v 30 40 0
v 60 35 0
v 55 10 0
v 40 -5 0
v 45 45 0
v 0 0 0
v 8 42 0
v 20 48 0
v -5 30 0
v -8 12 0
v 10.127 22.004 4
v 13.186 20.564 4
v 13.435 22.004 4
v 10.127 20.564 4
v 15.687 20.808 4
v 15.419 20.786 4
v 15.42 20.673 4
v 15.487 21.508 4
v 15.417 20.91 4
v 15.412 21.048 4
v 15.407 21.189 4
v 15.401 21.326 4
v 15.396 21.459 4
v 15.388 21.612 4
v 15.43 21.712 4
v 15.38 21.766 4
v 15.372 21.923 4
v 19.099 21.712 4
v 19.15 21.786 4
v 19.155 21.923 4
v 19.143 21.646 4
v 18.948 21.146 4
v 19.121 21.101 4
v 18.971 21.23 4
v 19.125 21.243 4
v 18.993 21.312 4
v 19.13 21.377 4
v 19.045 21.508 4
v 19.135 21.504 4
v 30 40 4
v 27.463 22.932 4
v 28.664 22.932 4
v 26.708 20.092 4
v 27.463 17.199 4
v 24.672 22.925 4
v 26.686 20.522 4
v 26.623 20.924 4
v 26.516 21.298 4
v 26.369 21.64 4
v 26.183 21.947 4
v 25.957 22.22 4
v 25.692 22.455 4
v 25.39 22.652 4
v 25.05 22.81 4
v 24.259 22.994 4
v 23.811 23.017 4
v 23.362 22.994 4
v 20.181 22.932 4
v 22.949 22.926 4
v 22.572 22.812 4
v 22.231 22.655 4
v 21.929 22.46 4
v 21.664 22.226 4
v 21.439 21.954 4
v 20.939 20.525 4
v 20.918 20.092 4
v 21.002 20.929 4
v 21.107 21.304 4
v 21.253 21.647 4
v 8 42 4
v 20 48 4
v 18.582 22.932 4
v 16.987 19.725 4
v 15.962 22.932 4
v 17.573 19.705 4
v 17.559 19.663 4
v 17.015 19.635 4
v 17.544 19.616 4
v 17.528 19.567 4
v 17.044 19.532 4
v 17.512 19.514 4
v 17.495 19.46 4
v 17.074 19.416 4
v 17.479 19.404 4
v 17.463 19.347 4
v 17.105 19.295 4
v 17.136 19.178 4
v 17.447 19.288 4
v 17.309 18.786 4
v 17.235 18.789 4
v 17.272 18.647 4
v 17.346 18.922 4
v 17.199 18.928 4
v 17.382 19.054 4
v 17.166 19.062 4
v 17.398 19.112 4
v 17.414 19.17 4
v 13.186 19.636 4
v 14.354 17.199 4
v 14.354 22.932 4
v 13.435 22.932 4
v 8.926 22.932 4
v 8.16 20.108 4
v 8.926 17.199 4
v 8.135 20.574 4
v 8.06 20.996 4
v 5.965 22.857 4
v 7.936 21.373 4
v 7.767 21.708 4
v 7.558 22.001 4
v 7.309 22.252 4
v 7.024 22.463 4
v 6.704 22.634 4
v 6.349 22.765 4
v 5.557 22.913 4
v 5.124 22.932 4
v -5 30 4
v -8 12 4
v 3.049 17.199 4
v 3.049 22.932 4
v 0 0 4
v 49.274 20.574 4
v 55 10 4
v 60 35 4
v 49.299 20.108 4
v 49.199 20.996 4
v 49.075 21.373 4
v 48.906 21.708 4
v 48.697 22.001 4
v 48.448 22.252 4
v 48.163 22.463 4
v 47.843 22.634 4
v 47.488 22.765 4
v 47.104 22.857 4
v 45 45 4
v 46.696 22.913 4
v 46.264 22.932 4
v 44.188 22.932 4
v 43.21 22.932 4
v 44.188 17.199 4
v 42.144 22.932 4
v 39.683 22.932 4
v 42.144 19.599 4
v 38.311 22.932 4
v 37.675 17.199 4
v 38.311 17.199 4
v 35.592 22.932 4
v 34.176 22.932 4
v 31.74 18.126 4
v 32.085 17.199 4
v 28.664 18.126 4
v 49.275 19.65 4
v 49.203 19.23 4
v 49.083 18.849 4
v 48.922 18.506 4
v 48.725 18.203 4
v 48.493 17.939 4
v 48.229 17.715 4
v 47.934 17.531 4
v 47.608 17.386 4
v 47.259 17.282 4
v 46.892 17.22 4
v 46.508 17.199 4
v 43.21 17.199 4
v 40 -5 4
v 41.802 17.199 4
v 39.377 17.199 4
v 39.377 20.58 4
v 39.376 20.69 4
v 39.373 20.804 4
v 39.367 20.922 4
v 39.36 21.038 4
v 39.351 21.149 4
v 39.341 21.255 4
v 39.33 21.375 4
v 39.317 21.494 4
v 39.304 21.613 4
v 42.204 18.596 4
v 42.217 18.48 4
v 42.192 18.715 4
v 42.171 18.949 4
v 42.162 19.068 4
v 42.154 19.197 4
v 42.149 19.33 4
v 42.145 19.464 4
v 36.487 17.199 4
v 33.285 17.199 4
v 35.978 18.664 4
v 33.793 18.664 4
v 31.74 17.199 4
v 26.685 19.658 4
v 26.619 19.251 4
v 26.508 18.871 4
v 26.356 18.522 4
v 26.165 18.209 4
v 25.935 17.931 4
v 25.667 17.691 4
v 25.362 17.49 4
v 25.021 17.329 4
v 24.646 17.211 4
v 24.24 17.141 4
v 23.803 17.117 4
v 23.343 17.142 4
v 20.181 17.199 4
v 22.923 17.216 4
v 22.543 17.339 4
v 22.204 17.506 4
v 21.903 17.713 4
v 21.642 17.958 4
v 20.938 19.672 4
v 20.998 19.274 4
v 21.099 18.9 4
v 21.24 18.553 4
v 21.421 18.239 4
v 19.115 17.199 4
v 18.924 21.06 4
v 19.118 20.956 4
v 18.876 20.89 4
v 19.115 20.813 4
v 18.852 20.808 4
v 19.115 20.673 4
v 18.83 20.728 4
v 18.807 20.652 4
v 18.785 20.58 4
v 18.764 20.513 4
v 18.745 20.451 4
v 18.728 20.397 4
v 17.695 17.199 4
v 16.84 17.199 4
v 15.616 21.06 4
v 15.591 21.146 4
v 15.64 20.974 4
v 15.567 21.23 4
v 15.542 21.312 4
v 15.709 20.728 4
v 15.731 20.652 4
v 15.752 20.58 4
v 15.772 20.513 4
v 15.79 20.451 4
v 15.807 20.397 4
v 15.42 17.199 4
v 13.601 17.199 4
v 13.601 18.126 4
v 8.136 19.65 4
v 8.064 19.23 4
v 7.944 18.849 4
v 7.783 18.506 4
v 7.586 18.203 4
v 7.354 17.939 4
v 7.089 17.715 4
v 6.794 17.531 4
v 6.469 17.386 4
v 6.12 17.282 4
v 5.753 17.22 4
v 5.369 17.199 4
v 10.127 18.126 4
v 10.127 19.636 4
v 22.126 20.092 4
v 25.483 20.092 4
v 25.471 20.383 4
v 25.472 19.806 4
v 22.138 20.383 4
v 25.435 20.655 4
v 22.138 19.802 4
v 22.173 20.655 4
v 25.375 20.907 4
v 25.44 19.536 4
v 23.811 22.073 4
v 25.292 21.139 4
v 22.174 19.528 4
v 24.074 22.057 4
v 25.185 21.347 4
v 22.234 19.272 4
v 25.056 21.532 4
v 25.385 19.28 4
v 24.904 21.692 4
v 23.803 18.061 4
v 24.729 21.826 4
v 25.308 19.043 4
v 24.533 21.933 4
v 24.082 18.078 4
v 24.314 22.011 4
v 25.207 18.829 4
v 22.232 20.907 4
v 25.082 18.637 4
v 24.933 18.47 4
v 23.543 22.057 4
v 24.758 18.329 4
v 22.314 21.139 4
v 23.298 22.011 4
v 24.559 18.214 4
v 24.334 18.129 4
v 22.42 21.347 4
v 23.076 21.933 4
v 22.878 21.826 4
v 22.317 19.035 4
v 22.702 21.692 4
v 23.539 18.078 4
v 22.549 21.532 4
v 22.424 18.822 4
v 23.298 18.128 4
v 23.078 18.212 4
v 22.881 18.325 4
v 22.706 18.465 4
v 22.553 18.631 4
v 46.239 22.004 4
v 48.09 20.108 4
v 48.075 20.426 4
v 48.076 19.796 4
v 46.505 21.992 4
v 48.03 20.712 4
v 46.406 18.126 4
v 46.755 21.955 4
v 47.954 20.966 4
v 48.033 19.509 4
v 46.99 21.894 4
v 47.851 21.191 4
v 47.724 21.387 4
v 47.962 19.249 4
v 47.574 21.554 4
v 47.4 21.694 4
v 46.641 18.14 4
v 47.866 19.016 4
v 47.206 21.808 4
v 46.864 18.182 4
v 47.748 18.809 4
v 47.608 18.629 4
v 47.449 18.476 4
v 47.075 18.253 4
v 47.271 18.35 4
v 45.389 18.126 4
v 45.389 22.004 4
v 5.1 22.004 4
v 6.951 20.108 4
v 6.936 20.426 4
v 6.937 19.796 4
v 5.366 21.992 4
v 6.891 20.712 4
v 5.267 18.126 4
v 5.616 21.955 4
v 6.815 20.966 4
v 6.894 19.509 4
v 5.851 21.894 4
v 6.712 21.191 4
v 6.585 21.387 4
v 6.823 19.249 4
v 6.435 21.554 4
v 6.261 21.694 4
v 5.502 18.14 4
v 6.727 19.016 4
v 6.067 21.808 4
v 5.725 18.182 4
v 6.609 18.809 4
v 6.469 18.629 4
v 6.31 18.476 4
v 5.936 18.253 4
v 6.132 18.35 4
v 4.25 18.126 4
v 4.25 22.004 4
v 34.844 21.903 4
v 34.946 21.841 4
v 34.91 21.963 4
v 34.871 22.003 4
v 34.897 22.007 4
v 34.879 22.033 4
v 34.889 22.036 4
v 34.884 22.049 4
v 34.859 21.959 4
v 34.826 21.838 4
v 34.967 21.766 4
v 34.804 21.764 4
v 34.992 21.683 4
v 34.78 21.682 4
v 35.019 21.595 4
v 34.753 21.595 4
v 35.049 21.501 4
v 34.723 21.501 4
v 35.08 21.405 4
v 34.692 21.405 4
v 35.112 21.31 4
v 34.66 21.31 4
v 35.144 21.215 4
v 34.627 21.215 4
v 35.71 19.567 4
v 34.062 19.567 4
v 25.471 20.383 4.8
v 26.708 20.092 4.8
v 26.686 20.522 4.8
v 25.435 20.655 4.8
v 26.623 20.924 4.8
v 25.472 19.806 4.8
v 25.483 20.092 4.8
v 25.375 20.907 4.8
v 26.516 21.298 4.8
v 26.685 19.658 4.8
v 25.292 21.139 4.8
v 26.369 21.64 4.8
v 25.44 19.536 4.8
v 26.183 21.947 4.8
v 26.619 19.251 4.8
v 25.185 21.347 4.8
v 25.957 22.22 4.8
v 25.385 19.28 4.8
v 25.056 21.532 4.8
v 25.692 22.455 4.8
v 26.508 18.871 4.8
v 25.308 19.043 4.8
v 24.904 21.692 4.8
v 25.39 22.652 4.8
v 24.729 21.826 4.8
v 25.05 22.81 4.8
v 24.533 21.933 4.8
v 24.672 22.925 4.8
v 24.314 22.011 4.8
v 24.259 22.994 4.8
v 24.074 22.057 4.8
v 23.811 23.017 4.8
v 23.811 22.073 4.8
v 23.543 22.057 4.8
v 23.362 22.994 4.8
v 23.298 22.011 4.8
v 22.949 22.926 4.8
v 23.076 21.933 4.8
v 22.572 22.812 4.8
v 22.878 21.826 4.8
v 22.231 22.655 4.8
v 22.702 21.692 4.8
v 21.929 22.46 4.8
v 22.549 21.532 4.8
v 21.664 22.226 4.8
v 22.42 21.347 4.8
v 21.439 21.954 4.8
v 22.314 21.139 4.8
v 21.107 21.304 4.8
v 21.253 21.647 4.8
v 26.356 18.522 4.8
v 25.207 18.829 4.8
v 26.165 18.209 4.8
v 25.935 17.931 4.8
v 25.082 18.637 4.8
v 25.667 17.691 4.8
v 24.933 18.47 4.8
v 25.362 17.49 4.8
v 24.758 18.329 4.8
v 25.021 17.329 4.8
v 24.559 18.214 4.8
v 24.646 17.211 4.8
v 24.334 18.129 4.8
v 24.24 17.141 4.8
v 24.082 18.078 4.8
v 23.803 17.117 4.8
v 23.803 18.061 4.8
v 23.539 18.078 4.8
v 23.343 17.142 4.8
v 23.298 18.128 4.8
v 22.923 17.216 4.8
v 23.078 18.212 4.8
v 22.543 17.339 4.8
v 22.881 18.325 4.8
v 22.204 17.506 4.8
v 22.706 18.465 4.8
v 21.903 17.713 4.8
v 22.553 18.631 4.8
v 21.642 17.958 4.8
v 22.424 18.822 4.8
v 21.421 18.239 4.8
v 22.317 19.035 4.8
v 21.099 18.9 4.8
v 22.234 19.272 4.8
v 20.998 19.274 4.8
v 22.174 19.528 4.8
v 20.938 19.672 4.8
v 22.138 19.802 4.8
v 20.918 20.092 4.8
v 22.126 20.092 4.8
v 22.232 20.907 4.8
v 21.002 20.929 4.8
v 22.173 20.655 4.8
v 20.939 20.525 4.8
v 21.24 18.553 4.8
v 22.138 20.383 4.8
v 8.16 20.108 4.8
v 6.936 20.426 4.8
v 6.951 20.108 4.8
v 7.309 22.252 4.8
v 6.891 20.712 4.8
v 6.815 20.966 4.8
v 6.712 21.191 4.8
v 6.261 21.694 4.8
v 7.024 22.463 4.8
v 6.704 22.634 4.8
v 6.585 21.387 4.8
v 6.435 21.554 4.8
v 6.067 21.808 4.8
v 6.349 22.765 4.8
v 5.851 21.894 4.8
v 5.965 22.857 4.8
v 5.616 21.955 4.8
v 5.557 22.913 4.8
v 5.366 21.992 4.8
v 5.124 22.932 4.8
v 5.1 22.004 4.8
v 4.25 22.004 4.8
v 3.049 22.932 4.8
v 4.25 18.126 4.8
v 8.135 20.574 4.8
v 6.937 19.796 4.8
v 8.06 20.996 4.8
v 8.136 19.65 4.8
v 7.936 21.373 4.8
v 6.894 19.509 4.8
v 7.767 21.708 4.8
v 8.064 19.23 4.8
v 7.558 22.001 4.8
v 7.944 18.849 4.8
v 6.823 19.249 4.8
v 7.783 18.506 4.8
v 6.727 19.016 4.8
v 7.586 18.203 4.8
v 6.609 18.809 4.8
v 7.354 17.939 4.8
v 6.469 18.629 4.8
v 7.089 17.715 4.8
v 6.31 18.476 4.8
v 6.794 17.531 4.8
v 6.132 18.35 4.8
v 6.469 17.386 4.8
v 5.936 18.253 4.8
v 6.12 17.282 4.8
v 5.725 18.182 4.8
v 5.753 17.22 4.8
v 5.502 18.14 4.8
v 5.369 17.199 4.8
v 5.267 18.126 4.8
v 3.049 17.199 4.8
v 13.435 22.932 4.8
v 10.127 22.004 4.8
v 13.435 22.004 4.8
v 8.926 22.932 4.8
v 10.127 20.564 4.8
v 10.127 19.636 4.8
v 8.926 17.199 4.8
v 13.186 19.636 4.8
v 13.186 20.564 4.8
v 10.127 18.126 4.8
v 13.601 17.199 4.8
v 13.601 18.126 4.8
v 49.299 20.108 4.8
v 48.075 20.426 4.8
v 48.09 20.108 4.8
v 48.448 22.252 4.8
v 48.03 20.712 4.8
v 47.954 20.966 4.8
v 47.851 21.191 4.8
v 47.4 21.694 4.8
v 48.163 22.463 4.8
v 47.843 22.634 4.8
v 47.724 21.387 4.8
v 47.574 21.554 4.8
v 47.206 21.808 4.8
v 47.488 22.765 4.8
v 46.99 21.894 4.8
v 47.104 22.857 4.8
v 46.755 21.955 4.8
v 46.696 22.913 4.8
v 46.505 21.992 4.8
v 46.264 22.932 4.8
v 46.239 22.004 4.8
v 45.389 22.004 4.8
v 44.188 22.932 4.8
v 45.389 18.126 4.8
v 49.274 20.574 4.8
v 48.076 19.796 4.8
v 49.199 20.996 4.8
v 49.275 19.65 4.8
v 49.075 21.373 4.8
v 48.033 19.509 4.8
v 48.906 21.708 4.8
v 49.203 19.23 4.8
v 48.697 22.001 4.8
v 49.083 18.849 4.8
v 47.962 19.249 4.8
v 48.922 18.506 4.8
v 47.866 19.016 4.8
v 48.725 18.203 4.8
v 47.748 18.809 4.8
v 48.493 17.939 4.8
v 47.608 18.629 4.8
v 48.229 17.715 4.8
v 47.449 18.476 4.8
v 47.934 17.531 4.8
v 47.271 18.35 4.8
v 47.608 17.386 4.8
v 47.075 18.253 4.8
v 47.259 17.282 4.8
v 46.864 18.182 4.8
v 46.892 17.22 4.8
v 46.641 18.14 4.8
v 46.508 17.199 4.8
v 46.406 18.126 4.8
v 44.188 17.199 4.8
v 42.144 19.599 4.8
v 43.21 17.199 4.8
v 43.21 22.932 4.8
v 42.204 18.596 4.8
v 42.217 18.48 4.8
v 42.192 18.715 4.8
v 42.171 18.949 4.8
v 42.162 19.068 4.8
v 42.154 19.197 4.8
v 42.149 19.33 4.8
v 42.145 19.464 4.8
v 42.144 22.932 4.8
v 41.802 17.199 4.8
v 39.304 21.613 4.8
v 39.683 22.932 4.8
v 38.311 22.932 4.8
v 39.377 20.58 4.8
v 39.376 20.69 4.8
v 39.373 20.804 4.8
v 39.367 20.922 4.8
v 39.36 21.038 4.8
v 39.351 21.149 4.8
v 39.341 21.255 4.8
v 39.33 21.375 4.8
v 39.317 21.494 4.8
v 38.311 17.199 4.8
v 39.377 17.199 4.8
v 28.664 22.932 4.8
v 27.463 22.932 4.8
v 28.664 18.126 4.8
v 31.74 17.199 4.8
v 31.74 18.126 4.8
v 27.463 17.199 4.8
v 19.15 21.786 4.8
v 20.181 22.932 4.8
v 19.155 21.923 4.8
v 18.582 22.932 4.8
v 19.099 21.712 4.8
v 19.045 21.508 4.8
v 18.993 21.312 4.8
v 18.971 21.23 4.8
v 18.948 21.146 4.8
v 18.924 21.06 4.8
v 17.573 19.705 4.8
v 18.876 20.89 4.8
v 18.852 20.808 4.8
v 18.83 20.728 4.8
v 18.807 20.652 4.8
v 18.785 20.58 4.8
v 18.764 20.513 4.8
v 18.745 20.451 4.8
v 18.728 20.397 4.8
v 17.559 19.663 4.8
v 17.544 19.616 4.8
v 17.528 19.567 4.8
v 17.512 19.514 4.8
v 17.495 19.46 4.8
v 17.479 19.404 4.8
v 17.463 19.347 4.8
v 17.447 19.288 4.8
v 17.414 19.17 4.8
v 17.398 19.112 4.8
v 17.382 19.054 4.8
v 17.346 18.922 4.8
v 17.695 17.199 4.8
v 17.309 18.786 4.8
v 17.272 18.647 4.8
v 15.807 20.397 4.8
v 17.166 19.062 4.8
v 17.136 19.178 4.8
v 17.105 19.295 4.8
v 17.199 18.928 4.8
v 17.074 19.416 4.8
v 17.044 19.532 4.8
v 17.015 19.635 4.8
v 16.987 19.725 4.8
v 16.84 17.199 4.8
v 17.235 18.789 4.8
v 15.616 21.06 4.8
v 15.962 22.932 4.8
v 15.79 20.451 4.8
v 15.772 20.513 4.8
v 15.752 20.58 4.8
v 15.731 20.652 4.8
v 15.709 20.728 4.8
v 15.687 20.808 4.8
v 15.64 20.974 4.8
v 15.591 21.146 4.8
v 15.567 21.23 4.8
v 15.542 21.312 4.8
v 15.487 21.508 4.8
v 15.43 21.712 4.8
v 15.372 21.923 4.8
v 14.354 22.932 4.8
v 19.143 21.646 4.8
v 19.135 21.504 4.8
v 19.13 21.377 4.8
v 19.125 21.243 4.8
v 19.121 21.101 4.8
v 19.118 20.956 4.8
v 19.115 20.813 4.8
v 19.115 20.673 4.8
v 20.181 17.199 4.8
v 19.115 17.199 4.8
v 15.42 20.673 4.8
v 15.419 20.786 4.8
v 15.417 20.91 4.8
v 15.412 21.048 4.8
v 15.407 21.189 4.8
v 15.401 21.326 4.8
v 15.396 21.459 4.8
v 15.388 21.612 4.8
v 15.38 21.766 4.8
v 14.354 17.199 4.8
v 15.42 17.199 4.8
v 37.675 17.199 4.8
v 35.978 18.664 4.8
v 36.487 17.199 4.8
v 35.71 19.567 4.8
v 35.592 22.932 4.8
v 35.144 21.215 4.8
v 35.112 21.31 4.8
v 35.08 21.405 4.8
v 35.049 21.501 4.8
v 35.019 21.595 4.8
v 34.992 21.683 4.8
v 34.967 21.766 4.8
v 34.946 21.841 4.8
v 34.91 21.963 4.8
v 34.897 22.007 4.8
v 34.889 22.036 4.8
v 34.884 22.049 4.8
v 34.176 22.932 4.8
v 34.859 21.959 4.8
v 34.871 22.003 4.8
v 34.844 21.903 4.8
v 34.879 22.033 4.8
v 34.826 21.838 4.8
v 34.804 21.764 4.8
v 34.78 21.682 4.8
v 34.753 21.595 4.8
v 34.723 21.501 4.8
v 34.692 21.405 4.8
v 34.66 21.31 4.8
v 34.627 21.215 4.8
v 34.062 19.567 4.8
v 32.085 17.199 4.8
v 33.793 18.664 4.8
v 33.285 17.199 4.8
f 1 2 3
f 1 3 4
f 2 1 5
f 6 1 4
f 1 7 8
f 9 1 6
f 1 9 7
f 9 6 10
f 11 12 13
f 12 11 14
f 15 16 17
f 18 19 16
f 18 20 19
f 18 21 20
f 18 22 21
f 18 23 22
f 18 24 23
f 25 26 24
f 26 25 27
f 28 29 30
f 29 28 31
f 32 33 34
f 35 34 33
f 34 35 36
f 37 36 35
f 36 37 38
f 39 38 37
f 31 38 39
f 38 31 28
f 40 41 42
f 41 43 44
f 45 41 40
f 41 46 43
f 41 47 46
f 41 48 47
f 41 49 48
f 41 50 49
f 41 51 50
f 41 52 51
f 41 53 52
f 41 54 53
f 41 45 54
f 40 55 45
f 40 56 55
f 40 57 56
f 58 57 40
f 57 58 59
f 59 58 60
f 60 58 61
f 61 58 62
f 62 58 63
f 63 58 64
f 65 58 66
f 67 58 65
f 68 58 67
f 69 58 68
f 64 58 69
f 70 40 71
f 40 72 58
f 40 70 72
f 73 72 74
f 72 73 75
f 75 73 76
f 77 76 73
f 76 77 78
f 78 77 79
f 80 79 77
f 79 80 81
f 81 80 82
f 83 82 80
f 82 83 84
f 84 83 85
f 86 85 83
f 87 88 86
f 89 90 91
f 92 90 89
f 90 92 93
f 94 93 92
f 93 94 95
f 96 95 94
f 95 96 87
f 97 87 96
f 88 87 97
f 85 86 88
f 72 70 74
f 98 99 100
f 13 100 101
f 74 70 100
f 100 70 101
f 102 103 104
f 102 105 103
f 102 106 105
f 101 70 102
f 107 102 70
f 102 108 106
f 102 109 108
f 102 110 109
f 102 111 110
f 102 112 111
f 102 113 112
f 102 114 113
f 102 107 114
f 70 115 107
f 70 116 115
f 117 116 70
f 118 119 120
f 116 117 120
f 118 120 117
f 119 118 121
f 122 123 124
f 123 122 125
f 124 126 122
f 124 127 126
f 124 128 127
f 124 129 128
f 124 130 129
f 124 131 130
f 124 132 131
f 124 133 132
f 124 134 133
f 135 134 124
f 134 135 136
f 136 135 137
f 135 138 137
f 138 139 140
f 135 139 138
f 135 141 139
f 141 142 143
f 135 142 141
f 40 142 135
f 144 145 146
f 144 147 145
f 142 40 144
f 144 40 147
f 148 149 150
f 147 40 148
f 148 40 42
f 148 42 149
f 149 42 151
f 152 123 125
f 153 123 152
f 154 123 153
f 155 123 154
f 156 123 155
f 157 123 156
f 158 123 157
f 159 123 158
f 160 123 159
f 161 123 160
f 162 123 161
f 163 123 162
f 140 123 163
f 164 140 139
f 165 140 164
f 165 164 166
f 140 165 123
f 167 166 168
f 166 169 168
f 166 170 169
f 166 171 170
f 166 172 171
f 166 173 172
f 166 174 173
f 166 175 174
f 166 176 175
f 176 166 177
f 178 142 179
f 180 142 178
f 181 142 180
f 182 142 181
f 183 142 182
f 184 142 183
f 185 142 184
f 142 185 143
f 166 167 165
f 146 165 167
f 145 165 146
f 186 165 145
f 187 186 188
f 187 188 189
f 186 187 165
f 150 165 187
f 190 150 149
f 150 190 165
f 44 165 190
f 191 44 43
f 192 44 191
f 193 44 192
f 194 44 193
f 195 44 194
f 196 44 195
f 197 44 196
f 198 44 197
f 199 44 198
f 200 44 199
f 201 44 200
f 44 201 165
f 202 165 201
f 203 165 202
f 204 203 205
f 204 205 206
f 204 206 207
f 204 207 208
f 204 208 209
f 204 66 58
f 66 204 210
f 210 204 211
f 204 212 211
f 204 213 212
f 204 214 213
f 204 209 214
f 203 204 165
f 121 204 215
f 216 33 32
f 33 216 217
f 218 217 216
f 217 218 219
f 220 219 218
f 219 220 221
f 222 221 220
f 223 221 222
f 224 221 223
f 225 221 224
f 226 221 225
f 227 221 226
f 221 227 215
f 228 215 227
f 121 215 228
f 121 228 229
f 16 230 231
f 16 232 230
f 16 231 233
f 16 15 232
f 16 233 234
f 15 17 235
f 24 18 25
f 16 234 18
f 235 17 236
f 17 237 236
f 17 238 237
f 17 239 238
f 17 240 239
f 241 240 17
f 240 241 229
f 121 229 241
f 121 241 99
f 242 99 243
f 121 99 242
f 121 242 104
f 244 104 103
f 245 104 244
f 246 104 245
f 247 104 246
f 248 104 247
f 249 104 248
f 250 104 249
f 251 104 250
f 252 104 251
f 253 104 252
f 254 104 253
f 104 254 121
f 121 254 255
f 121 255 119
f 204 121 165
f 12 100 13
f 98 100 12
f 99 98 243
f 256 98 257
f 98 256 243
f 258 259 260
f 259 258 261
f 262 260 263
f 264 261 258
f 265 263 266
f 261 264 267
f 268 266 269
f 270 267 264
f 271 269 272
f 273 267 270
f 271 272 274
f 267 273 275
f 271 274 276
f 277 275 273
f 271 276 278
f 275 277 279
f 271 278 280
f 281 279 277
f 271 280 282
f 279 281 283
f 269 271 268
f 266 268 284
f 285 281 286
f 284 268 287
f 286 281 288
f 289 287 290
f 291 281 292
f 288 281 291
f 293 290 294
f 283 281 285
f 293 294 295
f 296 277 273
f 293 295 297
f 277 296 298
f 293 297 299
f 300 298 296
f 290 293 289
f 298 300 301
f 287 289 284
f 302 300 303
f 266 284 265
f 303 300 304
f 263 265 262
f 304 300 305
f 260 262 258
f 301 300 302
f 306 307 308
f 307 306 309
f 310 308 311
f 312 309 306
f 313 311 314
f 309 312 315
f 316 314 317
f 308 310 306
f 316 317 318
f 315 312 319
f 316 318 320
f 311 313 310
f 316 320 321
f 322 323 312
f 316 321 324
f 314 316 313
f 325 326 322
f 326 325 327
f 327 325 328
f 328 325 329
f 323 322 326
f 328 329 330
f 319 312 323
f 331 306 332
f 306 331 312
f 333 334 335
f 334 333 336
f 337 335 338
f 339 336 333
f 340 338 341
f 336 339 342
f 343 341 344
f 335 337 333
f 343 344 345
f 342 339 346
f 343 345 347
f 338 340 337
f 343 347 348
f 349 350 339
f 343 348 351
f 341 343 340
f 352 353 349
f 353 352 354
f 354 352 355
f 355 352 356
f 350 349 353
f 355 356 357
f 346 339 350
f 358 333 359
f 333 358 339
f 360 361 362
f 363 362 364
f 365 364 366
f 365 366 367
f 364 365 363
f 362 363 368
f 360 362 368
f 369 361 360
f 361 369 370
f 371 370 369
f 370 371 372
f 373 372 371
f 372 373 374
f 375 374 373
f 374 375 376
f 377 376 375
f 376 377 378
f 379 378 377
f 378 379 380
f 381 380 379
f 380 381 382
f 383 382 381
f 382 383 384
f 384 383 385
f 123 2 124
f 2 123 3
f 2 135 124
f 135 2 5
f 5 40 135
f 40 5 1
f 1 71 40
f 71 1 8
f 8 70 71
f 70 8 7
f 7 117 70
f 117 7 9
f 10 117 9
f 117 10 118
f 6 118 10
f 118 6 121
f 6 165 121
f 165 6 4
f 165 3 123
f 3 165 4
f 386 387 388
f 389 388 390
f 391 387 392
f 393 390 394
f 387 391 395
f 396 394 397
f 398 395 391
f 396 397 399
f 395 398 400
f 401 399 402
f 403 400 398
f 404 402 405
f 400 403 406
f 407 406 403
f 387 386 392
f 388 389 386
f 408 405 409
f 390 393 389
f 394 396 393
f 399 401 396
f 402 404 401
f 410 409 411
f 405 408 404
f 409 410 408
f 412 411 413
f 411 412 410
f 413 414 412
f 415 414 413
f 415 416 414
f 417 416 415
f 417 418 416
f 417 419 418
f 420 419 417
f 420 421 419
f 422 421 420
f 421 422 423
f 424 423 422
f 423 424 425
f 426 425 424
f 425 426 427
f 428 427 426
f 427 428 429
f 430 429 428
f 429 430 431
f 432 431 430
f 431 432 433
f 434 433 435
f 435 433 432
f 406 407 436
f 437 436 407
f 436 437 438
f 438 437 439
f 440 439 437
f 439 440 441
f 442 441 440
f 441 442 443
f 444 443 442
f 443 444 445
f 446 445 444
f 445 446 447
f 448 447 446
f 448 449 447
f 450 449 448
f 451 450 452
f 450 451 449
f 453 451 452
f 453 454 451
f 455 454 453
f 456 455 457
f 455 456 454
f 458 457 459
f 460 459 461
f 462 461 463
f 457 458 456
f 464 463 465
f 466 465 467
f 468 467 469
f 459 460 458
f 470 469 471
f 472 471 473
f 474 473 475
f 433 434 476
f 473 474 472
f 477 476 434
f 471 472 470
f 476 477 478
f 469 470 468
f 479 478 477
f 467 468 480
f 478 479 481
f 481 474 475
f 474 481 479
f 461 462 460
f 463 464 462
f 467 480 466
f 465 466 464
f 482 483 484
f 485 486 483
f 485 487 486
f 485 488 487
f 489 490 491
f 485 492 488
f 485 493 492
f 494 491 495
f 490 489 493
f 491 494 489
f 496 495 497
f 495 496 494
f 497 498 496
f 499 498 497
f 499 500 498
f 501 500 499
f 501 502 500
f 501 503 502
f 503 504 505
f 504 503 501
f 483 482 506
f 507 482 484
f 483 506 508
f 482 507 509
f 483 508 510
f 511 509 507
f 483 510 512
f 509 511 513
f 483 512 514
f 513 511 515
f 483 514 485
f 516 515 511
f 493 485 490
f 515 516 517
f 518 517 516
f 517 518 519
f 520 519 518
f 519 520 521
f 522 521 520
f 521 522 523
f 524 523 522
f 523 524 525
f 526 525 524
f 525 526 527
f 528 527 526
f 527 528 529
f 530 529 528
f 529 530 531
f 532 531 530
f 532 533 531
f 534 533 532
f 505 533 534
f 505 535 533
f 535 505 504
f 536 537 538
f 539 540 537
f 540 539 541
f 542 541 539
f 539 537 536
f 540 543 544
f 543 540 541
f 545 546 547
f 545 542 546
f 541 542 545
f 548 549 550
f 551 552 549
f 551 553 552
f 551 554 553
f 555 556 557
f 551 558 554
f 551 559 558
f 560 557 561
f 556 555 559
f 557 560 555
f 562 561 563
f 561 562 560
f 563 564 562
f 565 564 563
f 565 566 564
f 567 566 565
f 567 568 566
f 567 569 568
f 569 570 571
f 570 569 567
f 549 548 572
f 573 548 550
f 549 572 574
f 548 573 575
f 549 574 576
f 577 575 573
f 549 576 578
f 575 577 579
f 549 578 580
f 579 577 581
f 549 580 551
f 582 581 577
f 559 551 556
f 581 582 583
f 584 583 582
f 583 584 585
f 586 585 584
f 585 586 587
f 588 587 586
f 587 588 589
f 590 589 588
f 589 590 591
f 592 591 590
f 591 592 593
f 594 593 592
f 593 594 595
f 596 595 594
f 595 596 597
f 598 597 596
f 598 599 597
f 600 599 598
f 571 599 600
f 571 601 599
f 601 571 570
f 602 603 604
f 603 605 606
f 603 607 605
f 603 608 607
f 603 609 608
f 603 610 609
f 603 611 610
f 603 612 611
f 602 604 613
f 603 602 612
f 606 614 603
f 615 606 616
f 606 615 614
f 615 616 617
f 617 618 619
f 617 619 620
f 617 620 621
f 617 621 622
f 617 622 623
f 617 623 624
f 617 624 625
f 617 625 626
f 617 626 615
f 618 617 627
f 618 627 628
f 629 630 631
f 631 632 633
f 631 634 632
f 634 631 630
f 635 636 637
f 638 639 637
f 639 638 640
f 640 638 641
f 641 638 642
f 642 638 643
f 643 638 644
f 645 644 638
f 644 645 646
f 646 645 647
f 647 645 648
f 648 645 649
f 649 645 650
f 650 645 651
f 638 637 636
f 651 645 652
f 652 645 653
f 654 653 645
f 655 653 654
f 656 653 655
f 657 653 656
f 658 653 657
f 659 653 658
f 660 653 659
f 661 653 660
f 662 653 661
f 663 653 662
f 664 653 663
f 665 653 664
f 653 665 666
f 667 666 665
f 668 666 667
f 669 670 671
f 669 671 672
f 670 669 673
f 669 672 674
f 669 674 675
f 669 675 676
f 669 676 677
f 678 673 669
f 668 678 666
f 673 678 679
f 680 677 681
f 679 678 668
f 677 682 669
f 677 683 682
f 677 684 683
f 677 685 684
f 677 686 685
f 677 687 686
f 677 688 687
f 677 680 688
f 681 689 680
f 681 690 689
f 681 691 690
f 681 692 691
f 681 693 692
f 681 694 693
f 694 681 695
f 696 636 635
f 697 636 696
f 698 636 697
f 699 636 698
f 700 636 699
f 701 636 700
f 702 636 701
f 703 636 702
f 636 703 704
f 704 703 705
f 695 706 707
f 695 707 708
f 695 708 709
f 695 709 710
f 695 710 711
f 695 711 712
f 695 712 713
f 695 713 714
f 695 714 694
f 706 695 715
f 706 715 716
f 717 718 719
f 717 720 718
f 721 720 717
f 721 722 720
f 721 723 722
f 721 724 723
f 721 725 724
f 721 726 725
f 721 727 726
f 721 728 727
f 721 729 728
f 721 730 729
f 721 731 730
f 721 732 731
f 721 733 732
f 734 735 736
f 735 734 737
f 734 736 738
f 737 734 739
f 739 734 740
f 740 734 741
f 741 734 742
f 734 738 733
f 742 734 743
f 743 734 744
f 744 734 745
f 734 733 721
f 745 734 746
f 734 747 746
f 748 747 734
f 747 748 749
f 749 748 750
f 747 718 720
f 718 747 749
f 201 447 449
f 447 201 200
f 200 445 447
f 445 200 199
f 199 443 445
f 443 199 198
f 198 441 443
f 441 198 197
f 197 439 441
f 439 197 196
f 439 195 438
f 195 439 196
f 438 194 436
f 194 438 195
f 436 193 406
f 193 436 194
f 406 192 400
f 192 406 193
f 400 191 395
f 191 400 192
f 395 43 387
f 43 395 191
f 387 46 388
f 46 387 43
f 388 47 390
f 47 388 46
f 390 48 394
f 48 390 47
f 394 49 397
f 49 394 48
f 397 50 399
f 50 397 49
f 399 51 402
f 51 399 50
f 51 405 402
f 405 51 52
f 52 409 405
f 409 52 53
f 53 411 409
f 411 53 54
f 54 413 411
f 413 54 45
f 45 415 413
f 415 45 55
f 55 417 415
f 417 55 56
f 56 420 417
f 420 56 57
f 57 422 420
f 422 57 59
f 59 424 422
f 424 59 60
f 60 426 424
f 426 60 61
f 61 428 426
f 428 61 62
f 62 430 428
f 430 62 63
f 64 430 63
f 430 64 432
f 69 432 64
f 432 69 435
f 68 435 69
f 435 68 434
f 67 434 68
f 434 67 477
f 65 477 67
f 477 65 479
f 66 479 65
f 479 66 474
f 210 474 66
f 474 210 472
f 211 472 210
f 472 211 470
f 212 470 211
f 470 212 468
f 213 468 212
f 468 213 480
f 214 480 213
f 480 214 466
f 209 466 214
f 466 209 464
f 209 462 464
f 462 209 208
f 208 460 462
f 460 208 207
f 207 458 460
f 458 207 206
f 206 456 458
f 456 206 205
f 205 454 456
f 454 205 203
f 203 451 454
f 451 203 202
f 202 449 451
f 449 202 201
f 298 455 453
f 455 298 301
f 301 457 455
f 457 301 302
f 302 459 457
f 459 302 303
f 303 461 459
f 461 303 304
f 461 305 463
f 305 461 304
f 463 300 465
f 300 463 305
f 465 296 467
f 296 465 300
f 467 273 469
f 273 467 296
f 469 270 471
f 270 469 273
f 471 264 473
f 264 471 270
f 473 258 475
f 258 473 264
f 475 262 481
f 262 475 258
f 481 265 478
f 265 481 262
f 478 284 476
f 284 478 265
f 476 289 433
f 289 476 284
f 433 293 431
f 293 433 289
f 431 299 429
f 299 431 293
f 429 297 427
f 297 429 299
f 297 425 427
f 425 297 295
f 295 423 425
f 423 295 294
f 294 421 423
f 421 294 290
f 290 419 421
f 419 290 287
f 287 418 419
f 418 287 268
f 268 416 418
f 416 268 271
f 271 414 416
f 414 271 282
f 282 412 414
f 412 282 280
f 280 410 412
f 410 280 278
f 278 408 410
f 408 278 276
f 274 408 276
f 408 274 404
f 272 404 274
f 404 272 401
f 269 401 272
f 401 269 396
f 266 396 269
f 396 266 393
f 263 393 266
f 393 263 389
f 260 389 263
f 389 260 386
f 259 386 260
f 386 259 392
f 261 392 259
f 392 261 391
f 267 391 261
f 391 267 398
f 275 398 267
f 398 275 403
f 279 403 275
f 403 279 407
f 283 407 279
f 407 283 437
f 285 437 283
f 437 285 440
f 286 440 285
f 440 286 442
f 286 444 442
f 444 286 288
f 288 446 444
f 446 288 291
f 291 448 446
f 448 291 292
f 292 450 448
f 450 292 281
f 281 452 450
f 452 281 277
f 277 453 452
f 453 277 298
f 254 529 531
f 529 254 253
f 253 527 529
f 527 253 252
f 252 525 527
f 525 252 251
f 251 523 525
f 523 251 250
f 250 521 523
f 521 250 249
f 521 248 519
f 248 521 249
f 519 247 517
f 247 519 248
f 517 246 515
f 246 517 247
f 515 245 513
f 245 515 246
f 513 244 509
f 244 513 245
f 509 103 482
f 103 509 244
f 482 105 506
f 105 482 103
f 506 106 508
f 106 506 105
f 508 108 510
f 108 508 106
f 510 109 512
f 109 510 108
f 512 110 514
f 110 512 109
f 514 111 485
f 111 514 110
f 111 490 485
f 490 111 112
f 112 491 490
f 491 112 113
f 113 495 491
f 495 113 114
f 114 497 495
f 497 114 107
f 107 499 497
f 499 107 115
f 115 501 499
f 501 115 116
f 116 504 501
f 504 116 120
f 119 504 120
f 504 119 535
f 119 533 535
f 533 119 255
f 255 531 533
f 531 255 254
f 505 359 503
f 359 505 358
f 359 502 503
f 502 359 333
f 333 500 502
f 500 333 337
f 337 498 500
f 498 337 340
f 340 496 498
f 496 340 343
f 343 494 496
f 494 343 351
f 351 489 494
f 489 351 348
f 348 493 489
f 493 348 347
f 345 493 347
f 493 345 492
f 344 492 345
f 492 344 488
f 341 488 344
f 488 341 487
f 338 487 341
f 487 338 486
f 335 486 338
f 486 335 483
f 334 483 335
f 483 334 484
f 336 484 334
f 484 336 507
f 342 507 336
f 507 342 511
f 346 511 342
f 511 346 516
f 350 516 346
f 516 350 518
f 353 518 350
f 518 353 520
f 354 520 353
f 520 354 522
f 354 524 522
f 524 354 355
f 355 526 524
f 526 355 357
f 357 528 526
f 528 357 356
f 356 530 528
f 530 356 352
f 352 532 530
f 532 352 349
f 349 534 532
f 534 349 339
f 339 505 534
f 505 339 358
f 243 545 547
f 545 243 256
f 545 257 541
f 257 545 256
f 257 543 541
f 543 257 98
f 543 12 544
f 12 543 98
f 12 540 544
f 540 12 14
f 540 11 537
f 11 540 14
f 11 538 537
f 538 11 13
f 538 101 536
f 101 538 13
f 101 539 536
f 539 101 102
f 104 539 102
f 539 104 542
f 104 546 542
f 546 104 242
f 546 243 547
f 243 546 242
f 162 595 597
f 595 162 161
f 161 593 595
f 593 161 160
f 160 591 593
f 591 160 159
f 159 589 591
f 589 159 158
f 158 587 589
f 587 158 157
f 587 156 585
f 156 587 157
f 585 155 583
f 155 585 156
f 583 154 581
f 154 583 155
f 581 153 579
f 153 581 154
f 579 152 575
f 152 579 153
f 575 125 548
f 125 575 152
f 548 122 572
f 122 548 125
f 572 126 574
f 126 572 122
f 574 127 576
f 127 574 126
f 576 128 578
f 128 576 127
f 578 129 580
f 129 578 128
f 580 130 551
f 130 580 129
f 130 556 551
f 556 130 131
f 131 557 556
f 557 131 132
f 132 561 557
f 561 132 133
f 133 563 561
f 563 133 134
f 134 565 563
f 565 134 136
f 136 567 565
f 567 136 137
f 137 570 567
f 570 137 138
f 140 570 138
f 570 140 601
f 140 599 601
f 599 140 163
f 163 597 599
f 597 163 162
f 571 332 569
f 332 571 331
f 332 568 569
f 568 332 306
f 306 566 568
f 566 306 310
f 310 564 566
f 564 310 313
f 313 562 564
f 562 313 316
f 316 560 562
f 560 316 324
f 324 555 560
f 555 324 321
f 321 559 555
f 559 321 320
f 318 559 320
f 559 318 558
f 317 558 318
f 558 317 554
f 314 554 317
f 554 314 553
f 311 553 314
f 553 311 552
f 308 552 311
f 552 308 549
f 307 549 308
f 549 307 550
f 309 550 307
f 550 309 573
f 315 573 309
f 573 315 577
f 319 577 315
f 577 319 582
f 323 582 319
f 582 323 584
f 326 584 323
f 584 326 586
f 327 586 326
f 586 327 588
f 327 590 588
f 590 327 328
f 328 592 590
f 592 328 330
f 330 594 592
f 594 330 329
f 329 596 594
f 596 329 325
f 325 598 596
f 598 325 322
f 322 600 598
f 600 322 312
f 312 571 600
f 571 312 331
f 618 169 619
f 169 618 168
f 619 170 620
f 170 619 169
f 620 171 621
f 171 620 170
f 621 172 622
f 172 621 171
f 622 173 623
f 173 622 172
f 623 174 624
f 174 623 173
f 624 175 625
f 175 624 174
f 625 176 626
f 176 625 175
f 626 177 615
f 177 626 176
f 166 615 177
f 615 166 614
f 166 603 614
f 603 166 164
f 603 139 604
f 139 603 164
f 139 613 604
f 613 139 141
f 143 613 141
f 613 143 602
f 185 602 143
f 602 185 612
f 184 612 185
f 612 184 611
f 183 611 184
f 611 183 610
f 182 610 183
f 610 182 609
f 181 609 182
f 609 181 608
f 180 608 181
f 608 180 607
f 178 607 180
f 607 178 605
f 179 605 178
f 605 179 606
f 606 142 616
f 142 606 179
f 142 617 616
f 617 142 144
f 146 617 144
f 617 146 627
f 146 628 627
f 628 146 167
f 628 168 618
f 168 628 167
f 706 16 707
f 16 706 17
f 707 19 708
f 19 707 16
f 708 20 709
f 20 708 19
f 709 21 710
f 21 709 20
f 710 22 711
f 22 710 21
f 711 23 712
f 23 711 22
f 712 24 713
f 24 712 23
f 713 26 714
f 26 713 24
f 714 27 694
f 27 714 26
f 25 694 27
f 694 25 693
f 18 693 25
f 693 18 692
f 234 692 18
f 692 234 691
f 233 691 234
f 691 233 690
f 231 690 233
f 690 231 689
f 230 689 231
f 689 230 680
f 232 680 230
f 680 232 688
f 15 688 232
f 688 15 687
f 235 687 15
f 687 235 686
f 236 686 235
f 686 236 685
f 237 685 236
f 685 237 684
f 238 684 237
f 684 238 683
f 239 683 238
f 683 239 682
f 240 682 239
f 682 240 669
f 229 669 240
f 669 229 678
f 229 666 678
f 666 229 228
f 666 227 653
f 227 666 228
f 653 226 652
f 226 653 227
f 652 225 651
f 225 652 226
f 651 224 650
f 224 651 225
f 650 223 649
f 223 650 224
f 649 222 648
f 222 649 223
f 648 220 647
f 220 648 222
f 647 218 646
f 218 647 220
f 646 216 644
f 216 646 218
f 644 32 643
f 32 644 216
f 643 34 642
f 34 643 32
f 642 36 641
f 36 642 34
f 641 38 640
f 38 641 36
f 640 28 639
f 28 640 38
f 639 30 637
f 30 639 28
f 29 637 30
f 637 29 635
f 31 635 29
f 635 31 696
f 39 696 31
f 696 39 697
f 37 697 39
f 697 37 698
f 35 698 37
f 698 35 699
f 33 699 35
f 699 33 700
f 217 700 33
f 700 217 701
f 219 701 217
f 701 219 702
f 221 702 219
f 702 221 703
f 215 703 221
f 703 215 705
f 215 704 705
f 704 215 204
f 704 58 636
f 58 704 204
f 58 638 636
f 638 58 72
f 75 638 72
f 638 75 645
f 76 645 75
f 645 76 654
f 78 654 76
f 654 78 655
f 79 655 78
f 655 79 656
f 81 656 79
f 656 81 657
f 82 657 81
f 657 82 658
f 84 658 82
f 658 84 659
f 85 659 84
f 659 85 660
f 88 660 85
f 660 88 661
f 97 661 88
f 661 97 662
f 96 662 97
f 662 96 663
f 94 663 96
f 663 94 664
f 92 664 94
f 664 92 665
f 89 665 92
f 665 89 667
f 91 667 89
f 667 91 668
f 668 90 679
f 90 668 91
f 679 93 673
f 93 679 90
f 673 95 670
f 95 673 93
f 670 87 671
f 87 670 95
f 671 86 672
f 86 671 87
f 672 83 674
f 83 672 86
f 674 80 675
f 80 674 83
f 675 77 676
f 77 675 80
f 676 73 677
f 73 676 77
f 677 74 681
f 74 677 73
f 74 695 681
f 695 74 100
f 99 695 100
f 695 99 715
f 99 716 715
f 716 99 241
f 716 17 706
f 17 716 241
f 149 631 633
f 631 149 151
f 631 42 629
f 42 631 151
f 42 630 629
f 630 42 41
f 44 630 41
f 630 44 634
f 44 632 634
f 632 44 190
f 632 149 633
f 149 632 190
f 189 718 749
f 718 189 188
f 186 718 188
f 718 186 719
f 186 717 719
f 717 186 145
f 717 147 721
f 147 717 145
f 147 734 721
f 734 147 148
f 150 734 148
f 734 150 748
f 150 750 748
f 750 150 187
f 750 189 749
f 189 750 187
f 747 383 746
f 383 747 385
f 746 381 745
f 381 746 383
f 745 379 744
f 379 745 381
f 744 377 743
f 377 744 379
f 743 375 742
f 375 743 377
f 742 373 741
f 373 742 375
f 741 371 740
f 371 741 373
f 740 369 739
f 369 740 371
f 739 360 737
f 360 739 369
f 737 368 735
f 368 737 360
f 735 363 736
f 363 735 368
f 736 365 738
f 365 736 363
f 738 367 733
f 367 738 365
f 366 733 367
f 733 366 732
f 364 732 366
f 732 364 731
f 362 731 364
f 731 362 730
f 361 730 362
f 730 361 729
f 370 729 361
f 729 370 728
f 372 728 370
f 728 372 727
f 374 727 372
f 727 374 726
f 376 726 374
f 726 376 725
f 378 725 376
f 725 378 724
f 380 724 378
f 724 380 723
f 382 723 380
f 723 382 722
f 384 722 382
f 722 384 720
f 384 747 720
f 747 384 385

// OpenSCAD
// file: piece.scad
// piece.scad — one puzzle piece: country outline base + embossed name label.
//
// Each piece is made of two bodies so Bambu Studio can assign a filament
// to each: base (white) and label (black). Export them separately (see
// puzzle.scad PART parameter) and merge into one object in Bambu Studio,
// or print single-color with a filament change at the label layer.

// ---- Global print parameters (mm) ----
BASE_THICKNESS = 4;    // white body height
LABEL_HEIGHT   = 0.8;  // raised text: 4 layers at 0.2 mm
LABEL_FONT     = "Liberation Sans:style=Bold";
MIN_LABEL_SIZE = 4;    // don't shrink text below this (printability floor)

// A piece's polygon comes in map millimetres (already Mercator-projected
// and scaled by scripts/generate_countries.py).

// Base body: the country outline, extruded.
// points/paths as accepted by polygon().
module piece_base(points, paths = undef) {
    linear_extrude(height = BASE_THICKNESS)
        polygon(points = points, paths = paths);
}

// Label body: country name centered at label_pos, sitting on top of the base.
// label_pos: [x, y] anchor in map mm (use polygon centroid / pole of
// inaccessibility from the generator). size: text height in mm.
// rot: optional rotation for long names in narrow countries.
module piece_label(name, label_pos, size = 6, rot = 0) {
    translate([label_pos[0], label_pos[1], BASE_THICKNESS])
        linear_extrude(height = LABEL_HEIGHT)
            rotate([0, 0, rot])
                text(name,
                     size = max(size, MIN_LABEL_SIZE),
                     font = LABEL_FONT,
                     halign = "center",
                     valign = "center");
}

// Complete piece. part = "all" | "base" | "label"
// (use "base"/"label" when exporting per-color STLs).
module piece(name, points, paths = undef, label_pos = [0, 0],
             label_size = 6, label_rot = 0, part = "all") {
    if (part == "all" || part == "base")
        color("white") piece_base(points, paths);
    if (part == "all" || part == "label")
        color("black") piece_label(name, label_pos, label_size, label_rot);
}
// main file
// puzzle.scad — main entry point for the world-map country puzzle.
//
// Preview:  open this file in OpenSCAD.
// Export:   openscad -o export/<name>.stl -D 'PART="base"' scad/puzzle.scad
//
// Country polygon data is generated into scad/countries/ by
// scripts/generate_countries.py (Natural Earth GeoJSON → Mercator mm).

include <piece.scad>

// ---- Map parameters ----
MAP_WIDTH = 800;   // full world width in mm (drives generator scale)
PART = "all";      // "all" | "base" | "label" — for per-color export

// ---- Demo piece (placeholder until scad/countries/ is generated) ----
// A rough, recognizable placeholder outline so the pipeline can be tested
// end to end before real country data exists.
DEMO_POINTS = [
    [0, 0], [40, -5], [55, 10], [60, 35], [45, 45],
    [30, 40], [20, 48], [8, 42], [-5, 30], [-8, 12]
];

piece(
    name       = "DEMOLAND",
    points     = DEMO_POINTS,
    label_pos  = [26, 20],
    label_size = 6,
    part       = PART
);
